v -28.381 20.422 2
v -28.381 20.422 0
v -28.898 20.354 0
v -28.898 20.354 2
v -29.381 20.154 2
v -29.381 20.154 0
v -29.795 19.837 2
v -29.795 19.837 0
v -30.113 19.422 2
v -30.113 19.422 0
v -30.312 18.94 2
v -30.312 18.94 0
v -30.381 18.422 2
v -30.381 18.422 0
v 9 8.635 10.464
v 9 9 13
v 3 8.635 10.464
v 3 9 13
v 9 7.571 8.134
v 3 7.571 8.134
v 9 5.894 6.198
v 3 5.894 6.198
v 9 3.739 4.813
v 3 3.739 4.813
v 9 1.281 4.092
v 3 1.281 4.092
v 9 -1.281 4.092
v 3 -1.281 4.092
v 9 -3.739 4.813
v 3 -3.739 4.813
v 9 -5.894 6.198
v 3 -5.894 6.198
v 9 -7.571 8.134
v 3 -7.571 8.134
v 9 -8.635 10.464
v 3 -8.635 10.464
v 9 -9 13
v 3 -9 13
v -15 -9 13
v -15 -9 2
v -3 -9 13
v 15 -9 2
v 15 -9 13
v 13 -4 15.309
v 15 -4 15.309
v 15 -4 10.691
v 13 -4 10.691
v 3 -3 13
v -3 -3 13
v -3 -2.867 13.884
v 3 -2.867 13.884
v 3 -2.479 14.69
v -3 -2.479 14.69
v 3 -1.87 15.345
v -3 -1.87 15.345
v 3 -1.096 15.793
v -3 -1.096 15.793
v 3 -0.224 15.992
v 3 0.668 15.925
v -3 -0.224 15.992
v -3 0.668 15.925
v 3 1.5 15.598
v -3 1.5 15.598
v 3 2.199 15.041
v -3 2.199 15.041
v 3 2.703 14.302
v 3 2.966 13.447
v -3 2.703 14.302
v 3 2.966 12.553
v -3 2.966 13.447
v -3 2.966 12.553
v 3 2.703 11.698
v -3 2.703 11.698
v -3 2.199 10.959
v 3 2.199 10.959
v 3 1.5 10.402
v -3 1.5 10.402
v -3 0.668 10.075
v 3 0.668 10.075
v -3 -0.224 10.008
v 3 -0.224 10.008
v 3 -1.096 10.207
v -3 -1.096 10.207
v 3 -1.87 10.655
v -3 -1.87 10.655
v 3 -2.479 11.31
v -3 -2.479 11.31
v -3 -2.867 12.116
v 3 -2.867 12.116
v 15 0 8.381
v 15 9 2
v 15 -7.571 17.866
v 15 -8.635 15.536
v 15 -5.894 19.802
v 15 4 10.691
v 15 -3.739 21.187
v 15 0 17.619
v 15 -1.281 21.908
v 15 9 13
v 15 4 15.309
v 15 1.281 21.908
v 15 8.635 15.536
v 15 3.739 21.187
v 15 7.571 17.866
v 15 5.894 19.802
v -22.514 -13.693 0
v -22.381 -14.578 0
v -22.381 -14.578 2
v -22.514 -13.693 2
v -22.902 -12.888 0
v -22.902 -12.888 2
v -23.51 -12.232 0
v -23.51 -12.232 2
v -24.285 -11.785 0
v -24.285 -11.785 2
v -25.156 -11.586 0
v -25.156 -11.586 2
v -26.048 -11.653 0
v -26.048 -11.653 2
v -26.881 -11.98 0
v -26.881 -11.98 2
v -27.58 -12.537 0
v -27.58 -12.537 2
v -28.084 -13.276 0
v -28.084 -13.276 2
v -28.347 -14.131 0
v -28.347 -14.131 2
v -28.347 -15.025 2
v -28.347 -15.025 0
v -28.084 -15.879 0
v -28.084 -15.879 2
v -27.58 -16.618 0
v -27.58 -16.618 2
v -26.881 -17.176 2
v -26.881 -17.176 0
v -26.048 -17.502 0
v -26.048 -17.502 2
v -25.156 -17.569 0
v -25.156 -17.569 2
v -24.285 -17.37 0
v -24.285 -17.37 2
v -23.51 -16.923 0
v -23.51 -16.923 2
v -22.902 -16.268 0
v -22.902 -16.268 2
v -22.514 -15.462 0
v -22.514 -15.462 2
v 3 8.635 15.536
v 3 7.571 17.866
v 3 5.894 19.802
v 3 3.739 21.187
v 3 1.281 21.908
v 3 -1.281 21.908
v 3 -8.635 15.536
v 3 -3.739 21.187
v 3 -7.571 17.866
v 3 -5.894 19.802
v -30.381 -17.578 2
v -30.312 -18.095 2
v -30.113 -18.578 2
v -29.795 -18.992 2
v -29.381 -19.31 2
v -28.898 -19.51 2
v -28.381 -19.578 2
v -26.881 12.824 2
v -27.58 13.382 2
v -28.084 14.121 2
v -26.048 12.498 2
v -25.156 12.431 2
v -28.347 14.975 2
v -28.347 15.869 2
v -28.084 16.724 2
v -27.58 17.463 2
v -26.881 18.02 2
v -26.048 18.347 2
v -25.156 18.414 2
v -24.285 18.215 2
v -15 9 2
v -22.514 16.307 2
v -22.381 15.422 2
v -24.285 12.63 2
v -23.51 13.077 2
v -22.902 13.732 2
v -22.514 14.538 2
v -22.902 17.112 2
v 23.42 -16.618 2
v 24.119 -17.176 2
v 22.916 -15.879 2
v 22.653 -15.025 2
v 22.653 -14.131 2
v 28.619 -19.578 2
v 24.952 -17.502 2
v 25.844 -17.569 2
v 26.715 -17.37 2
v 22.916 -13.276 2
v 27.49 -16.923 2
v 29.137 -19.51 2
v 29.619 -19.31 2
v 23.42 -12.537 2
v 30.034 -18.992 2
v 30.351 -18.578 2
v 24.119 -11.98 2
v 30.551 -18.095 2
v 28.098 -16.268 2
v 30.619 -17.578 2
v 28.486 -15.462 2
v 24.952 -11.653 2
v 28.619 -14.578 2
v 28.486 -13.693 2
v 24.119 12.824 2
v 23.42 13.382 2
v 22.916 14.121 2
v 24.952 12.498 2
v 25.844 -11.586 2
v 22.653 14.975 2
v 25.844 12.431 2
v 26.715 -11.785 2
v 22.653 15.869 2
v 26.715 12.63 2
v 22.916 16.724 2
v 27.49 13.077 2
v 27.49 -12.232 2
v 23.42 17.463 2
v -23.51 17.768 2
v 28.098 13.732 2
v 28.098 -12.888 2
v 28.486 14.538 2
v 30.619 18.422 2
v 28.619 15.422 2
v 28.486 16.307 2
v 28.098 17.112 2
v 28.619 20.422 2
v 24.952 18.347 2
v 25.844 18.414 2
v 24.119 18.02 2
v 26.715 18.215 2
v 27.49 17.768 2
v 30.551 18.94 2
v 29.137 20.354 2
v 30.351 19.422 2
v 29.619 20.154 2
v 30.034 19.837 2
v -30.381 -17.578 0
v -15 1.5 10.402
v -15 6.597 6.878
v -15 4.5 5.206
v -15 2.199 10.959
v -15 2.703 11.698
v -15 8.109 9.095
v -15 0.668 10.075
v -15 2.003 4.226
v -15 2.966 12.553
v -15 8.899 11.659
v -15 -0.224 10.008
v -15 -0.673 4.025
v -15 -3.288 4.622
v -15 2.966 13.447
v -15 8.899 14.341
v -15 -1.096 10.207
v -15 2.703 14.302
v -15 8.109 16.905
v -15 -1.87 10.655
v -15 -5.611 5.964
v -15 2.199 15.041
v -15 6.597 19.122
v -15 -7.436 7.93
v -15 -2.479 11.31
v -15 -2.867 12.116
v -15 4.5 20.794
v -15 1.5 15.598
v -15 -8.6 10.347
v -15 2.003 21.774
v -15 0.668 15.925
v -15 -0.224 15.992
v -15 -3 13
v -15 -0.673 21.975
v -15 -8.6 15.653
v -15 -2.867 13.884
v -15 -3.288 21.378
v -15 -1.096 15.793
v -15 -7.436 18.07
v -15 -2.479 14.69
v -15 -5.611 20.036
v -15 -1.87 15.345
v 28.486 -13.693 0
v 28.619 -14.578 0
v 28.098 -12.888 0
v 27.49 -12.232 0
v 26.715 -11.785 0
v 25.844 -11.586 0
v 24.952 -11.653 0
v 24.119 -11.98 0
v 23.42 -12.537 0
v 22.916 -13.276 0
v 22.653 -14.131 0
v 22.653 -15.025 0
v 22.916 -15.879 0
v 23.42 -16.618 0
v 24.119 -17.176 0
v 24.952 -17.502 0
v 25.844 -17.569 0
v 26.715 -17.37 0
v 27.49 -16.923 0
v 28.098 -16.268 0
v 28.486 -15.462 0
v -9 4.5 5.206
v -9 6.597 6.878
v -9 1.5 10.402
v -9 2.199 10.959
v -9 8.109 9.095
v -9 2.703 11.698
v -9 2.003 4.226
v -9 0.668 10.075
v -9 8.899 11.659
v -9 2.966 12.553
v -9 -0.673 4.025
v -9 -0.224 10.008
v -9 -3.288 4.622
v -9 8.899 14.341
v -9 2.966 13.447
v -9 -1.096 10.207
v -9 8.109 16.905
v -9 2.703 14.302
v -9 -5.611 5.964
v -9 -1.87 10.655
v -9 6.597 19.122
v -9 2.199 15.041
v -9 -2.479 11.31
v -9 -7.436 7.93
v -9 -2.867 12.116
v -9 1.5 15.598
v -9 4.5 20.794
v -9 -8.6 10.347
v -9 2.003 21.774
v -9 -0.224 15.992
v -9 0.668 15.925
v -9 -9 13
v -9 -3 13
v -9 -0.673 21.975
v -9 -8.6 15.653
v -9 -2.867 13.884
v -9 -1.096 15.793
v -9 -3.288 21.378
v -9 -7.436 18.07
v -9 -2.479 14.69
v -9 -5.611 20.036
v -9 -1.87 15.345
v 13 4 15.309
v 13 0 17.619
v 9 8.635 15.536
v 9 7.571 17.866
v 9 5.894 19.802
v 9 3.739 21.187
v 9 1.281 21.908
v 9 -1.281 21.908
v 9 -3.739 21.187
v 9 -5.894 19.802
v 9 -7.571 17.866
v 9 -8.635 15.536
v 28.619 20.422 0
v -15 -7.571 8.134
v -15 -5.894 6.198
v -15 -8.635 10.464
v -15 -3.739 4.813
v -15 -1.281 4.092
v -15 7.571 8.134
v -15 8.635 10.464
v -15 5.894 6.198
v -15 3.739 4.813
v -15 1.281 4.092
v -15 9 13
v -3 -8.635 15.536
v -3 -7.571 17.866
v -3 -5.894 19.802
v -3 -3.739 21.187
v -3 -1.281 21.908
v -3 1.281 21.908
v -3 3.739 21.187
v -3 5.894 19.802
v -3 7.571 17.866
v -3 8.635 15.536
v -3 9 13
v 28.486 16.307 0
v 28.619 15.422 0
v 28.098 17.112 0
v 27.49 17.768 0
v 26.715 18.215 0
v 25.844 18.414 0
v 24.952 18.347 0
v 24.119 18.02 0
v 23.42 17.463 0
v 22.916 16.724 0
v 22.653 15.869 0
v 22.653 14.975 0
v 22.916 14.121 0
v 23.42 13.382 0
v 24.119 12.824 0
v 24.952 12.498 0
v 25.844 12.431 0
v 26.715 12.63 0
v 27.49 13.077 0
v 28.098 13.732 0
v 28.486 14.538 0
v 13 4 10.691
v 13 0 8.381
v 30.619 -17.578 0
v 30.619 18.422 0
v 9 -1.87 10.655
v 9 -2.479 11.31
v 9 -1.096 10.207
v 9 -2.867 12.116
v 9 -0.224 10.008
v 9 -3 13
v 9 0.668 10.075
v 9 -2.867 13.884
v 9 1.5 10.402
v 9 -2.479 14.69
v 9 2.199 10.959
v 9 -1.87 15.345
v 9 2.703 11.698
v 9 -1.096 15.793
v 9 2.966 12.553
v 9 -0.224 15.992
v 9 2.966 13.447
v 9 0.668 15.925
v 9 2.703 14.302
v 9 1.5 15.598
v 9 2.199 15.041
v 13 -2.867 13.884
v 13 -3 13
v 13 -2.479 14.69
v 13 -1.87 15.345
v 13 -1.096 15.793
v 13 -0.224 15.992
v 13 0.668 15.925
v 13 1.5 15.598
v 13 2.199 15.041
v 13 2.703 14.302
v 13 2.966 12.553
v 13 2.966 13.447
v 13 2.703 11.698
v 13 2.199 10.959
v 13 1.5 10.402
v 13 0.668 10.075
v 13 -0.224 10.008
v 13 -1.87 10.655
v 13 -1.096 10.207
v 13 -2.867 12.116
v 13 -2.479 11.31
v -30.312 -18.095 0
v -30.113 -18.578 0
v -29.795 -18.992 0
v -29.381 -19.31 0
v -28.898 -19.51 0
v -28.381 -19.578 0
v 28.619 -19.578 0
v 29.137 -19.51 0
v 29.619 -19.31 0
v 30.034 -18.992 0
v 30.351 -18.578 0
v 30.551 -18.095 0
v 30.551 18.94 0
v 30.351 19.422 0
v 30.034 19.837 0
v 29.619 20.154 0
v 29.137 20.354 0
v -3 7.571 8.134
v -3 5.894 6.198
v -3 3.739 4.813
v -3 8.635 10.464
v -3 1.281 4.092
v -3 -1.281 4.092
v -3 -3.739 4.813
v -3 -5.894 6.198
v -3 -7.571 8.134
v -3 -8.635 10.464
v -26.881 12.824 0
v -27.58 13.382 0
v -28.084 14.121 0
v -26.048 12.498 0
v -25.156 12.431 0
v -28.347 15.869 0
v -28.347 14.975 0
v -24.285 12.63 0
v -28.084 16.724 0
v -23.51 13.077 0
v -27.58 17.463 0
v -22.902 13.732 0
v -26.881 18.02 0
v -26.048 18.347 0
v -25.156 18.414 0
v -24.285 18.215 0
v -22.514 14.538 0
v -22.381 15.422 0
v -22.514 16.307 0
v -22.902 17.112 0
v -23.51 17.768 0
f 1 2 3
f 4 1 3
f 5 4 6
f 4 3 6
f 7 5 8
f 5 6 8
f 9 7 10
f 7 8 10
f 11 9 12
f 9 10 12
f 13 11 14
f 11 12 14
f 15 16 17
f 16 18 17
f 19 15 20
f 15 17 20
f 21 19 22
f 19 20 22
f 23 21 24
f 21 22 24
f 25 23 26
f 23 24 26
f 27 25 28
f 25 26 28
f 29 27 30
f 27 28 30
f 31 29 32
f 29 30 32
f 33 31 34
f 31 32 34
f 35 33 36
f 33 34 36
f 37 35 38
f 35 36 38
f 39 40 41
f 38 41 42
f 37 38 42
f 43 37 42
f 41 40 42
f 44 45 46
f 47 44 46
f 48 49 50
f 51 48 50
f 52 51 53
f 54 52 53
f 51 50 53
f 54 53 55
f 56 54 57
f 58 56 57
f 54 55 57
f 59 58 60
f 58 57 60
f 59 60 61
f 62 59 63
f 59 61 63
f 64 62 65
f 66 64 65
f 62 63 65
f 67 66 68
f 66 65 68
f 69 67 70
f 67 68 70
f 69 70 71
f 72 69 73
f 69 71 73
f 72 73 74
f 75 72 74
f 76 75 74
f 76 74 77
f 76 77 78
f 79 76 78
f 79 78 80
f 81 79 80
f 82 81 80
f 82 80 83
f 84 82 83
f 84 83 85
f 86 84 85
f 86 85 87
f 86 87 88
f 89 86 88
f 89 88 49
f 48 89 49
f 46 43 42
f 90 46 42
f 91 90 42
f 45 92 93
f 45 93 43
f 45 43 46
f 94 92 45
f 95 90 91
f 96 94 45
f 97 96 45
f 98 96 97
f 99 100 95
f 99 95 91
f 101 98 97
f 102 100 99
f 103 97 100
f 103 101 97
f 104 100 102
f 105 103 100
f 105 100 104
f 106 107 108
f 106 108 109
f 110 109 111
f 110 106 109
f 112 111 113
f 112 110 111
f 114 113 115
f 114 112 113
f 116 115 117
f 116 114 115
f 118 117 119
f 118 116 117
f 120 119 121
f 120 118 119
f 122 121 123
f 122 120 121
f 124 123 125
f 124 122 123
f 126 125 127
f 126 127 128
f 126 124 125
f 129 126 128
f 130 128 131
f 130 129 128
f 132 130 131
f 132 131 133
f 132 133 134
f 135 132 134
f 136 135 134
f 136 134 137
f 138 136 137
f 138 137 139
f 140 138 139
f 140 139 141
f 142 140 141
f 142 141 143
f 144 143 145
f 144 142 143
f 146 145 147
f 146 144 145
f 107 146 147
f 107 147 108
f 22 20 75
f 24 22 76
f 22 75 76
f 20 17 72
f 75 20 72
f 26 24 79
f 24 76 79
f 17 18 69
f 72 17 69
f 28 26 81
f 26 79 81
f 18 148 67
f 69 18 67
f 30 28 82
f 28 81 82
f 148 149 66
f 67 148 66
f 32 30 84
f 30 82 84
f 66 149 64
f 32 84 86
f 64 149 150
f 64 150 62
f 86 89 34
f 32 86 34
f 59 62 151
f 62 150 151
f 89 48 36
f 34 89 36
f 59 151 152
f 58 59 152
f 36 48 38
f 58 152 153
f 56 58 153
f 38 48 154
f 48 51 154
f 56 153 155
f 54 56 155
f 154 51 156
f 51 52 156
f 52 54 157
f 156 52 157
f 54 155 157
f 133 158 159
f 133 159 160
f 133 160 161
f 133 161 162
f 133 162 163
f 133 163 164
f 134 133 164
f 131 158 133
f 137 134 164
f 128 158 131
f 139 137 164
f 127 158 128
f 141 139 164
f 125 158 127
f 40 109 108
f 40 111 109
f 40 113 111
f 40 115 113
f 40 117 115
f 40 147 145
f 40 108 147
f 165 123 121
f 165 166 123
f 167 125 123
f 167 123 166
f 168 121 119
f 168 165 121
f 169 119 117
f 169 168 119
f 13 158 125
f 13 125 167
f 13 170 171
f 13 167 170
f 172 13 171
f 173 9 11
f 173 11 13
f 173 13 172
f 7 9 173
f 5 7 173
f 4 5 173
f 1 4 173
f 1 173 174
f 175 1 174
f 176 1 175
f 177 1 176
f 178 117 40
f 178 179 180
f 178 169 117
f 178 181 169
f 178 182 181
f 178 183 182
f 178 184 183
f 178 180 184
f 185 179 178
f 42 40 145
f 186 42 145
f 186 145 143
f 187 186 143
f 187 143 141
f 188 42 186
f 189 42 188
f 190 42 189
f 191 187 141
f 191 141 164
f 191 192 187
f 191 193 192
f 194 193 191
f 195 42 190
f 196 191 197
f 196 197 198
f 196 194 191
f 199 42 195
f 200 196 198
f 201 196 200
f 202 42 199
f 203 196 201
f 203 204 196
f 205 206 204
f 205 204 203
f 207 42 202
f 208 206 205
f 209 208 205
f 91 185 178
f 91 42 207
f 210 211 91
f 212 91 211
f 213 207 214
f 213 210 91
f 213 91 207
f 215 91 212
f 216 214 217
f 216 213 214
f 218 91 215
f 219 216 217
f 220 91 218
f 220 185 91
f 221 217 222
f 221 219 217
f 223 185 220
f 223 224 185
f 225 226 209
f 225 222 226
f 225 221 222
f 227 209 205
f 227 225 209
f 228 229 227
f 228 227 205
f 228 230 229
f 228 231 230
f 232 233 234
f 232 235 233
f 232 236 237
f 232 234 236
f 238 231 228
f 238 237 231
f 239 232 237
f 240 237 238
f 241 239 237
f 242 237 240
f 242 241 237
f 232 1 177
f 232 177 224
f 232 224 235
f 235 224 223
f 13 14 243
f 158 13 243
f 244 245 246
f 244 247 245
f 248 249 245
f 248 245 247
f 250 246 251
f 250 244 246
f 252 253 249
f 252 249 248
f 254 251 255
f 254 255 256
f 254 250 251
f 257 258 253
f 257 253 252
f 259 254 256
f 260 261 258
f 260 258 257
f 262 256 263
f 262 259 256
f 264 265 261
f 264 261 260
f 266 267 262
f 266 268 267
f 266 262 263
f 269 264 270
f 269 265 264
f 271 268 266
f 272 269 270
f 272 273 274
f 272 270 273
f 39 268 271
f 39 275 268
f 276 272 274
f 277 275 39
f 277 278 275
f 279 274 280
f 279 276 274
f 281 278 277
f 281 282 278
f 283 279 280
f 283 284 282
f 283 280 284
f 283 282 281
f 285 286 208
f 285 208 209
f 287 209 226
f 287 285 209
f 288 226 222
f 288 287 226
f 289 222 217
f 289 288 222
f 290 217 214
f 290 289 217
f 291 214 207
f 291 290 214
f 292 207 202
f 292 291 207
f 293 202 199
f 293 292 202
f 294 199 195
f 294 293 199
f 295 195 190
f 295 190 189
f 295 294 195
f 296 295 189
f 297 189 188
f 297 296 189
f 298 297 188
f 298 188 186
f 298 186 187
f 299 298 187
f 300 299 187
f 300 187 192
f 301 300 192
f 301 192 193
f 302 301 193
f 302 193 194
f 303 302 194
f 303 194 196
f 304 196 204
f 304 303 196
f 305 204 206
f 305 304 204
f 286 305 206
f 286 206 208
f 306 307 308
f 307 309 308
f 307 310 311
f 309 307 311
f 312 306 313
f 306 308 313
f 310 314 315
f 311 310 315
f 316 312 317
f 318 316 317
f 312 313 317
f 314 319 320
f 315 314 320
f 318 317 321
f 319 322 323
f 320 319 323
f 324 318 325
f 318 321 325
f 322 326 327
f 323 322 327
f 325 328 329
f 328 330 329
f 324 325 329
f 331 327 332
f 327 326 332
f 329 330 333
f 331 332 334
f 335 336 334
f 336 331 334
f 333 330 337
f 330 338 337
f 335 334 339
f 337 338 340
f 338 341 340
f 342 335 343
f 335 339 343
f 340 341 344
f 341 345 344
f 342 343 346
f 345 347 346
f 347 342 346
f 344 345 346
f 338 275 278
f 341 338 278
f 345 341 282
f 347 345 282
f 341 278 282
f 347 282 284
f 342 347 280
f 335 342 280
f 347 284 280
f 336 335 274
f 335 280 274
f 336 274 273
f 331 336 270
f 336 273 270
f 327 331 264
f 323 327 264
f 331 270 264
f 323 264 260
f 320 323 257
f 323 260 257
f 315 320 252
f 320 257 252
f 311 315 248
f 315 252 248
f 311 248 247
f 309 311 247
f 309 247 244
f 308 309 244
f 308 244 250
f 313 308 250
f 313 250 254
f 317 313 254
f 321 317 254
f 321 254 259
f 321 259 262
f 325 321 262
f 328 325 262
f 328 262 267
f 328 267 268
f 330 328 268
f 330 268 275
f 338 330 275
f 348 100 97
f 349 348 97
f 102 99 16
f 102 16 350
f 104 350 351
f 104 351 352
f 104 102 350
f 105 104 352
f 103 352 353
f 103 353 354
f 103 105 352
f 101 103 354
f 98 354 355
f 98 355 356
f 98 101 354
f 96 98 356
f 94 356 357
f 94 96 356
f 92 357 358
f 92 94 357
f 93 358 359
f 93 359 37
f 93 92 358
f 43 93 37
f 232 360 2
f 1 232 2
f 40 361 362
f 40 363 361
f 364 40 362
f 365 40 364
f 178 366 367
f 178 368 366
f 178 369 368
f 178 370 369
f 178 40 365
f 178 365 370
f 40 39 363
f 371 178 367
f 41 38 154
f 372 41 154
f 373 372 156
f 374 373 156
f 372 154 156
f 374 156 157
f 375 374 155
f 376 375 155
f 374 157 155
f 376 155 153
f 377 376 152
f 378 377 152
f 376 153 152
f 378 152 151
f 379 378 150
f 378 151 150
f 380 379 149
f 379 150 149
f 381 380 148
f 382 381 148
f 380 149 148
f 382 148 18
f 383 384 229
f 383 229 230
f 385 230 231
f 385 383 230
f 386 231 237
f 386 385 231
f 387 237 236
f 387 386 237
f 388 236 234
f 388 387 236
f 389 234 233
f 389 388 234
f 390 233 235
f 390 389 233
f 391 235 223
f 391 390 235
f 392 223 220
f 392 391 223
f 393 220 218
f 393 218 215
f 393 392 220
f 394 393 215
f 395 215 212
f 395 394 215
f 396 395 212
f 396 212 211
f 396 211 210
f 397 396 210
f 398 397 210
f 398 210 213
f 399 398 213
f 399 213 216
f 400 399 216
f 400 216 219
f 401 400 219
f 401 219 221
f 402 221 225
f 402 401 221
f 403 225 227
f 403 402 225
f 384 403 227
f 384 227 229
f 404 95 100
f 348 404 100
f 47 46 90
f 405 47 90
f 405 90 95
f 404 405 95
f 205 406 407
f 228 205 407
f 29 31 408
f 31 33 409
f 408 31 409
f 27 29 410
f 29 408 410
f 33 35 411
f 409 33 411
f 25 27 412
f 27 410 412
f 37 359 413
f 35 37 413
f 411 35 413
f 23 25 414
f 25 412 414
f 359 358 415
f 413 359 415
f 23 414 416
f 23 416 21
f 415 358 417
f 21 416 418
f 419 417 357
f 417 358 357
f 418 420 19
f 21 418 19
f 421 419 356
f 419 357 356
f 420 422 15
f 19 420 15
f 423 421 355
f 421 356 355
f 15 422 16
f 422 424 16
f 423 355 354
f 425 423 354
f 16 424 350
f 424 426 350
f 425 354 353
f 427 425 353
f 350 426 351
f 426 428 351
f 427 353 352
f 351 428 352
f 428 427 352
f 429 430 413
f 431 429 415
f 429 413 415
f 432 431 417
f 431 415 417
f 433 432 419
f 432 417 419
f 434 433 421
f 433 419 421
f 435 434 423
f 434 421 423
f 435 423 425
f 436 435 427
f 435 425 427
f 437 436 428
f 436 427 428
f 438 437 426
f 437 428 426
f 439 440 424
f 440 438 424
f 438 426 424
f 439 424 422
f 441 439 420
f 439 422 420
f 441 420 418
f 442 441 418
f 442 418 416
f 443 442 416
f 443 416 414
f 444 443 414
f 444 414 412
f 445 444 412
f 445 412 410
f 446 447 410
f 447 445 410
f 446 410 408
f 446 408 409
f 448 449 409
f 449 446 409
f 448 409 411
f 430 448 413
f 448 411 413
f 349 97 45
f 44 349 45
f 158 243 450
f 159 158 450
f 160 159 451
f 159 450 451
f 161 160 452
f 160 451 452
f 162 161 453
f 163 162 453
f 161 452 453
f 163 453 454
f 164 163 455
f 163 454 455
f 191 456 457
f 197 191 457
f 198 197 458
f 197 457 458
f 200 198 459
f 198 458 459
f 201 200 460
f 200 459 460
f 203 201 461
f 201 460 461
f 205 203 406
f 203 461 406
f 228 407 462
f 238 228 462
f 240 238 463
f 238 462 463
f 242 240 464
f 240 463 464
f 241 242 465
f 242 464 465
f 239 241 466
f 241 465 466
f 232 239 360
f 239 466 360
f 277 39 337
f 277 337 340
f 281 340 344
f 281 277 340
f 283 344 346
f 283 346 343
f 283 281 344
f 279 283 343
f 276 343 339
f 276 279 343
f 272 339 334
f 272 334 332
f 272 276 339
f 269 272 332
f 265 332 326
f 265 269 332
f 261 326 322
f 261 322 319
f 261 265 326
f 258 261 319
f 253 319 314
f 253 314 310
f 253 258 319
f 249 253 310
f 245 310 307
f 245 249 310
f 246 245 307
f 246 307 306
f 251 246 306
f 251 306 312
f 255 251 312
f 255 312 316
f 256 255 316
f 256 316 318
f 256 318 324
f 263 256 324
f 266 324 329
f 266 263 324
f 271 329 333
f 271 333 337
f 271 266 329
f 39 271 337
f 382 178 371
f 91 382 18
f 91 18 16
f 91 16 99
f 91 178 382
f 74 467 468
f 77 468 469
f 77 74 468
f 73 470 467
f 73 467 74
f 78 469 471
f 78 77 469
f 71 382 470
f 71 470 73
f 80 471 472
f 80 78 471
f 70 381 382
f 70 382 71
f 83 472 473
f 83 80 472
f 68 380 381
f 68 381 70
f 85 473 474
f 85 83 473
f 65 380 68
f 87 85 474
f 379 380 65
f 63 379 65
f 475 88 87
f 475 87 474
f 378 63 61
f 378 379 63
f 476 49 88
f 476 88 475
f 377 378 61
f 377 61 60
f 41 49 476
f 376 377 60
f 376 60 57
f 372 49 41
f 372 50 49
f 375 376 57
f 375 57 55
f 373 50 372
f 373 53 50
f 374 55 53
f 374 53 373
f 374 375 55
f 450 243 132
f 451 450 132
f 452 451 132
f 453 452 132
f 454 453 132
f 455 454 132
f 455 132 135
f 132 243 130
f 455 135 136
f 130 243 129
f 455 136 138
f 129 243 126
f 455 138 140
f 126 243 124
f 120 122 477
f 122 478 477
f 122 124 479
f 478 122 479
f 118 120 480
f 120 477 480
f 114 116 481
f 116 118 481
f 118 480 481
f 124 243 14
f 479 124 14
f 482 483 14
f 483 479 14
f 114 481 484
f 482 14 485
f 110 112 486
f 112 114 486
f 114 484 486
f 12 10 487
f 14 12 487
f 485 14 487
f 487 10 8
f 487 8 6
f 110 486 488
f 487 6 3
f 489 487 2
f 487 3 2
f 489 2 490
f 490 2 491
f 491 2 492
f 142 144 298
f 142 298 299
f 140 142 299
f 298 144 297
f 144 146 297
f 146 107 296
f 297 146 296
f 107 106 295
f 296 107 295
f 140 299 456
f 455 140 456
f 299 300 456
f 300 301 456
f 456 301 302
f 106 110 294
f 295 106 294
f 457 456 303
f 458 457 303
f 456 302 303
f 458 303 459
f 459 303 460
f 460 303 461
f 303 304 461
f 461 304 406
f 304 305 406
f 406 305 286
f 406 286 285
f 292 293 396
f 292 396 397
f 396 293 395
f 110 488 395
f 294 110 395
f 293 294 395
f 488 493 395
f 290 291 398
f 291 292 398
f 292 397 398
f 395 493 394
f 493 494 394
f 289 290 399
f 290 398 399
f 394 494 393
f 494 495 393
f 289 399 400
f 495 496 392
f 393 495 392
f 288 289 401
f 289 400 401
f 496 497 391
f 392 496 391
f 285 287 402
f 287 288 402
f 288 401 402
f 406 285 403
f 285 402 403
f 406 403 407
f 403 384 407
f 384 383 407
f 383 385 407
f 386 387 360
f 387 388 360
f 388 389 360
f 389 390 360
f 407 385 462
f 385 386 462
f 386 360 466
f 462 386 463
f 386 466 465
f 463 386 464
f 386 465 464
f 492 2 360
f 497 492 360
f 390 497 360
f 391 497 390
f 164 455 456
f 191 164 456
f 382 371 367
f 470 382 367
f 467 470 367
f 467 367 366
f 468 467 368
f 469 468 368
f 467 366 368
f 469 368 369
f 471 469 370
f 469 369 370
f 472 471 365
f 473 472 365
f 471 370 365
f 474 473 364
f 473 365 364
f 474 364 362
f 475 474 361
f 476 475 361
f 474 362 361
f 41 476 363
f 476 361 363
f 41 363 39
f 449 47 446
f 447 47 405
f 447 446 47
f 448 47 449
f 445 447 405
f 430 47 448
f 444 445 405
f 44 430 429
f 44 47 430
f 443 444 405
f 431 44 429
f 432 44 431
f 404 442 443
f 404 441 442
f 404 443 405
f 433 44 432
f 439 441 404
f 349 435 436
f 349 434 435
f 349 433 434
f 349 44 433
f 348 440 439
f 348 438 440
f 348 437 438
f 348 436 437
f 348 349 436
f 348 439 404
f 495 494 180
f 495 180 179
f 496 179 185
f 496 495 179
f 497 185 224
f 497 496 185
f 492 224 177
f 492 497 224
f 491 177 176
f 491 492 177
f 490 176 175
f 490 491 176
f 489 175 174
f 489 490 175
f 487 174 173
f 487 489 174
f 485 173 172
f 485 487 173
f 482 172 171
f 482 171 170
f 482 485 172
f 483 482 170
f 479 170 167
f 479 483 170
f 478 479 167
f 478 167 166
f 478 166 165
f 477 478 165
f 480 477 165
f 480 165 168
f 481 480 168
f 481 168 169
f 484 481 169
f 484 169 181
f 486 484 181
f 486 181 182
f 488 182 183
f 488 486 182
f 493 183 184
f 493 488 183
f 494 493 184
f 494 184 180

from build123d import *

# Parameters (mm, degrees)
F0_R      = 3
F1_DEPTH  = 2
F2_W      = 30
F2_H      = 18
F3_DEPTH  = 20
F6_DEPTH  = 30
F7_R      = 9
F8_DEPTH  = 30
F10_R     = 9
F11_DEPTH = 6
F13_START = 6
F12_R     = 9
F13_DEPTH = 12
F14_DEPTH = 6
F15_DEPTH = 6
F16_R     = 3
F17_DEPTH = 30
F18_R     = 3
F19_DEPTH = 2


# Not quite as in the source:
# - a feature names something its author has since deleted; it is built from what else it names


with BuildPart() as f1:
    # F0 (on Top) → F1 (new body)
    with BuildSketch(Plane.XY):
        with BuildLine():
            Line((28.6193578921, 20.4223022205), (-28.3806421079, 20.4223022205))
            ThreePointArc((-28.3806421079, 20.4223022205), (-29.7948556703, 19.8365157828), (-30.3806421079, 18.4223022205))
            Line((-30.3806421079, 18.4223022205), (-30.3806421079, -17.5776977795))
            ThreePointArc((-30.3806421079, -17.5776977795), (-29.7948556703, -18.9919113419), (-28.3806421079, -19.5776977795))
            Line((-28.3806421079, -19.5776977795), (28.6193578921, -19.5776977795))
            ThreePointArc((28.6193578921, -19.5776977795), (30.0335714544, -18.9919113419), (30.6193578921, -17.5776977795))
            Line((30.6193578921, -17.5776977795), (30.6193578921, 18.4223022205))
            ThreePointArc((30.6193578921, 18.4223022205), (30.0335714544, 19.8365157828), (28.6193578921, 20.4223022205))
        make_face()
        with Locations((-25.3806421079, -14.5776977795)):
            Circle(F0_R, mode=Mode.SUBTRACT)
        with Locations((25.6193578921, -14.5776977795)):
            Circle(F0_R, mode=Mode.SUBTRACT)
        with Locations((-25.3806421079, 15.4223022205)):
            Circle(F0_R, mode=Mode.SUBTRACT)
        with Locations((25.6193578921, 15.4223022205)):
            Circle(F0_R, mode=Mode.SUBTRACT)
    extrude(amount=F1_DEPTH)

    # F2 (on face) → F3 (join)
    with BuildSketch(Plane.XY.offset(2)):
        Rectangle(F2_W, F2_H)
    extrude(amount=F3_DEPTH)

    # F5 (on face) + F4 (on face) → F6 (cut)
    with BuildSketch(Plane(origin=(-15, 0, 0), x_dir=(0, -1, 0), z_dir=(-1, 0, 0))):
        with BuildLine():
            Line((9, 22), (0, 22))
            ThreePointArc((0, 22), (6.3639610307, 19.3639610307), (9, 13))
            Line((9, 13), (9, 22))
        make_face()
    with BuildSketch(Plane(origin=(-15, 0, 0), x_dir=(0, -1, 0), z_dir=(-1, 0, 0))):
        with BuildLine():
            ThreePointArc((-9, 13), (-6.3639610307, 19.3639610307), (0, 22))
            Line((0, 22), (-9, 22))
            Line((-9, 22), (-9, 13))
        make_face()
    extrude(amount=-F6_DEPTH, mode=Mode.SUBTRACT)

    # F7 (on face) → F8 (cut)
    with BuildSketch(Plane(origin=(-15, 0, 0), x_dir=(0, -1, 0), z_dir=(-1, 0, 0))):
        with Locations((0, 13)):
            Circle(F7_R)
    extrude(amount=-F8_DEPTH, mode=Mode.SUBTRACT)

    # F10 (on face) → F11 (join)
    with BuildSketch(Plane.YZ.offset(15)):
        with Locations((0, 13)):
            Circle(F10_R)
    extrude(amount=-F11_DEPTH)

    # F12 (on face) → F13 (join)
    with BuildSketch(Plane(origin=(9, 0, 0), x_dir=(0, -1, 0), z_dir=(-1, 0, 0)).offset(F13_START)):
        with Locations((0, 13)):
            Circle(F12_R)
    extrude(amount=F13_DEPTH)

    # F14 (cut): a face of the model
    f14_faces = [f1.faces().sort_by_distance(p)[0] for p in [
        (-9, 0, 13),
    ]]
    extrude(f14_faces, amount=-F14_DEPTH, mode=Mode.SUBTRACT)


with BuildPart() as f15:
    # F9 (on face) → F15 (new body)
    with BuildSketch(Plane(origin=(-15, 0, 0), x_dir=(0, -1, 0), z_dir=(-1, 0, 0))):
        with BuildLine():
            ThreePointArc((-9, 13), (0, 4), (9, 13))
            ThreePointArc((9, 13), (0, 22), (-9, 13))
        make_face()
    extrude(amount=-F15_DEPTH)


with BuildPart() as f17_tool:
    # F16 (on face) → F17 (new body)
    with BuildSketch(Plane(origin=(-15, 0, 0), x_dir=(0, -1, 0), z_dir=(-1, 0, 0))):
        with Locations((0, 13)):
            Circle(F16_R)
    extrude(amount=-F17_DEPTH)


with BuildPart() as f1_1:
    add(f1.part)

    # F17: cut by f17_tool
    add(f17_tool.part, mode=Mode.SUBTRACT)

    # F18 (on face) → F19 (cut)
    with BuildSketch(Plane.YZ.offset(15)):
        Polygon((4, 10.6905989232), (4, 15.3094010768), (0, 17.6188021535), (-4, 15.3094010768), (-4, 10.6905989232), (0, 8.3811978465), align=None)
        with Locations((0, 13)):
            Circle(F18_R, mode=Mode.SUBTRACT)
    extrude(amount=-F19_DEPTH, mode=Mode.SUBTRACT)


with BuildPart() as f15_1:
    add(f15.part)

    # F17: cut by f17_tool
    add(f17_tool.part, mode=Mode.SUBTRACT)


solid = Compound([f1_1.part, f15_1.part])
